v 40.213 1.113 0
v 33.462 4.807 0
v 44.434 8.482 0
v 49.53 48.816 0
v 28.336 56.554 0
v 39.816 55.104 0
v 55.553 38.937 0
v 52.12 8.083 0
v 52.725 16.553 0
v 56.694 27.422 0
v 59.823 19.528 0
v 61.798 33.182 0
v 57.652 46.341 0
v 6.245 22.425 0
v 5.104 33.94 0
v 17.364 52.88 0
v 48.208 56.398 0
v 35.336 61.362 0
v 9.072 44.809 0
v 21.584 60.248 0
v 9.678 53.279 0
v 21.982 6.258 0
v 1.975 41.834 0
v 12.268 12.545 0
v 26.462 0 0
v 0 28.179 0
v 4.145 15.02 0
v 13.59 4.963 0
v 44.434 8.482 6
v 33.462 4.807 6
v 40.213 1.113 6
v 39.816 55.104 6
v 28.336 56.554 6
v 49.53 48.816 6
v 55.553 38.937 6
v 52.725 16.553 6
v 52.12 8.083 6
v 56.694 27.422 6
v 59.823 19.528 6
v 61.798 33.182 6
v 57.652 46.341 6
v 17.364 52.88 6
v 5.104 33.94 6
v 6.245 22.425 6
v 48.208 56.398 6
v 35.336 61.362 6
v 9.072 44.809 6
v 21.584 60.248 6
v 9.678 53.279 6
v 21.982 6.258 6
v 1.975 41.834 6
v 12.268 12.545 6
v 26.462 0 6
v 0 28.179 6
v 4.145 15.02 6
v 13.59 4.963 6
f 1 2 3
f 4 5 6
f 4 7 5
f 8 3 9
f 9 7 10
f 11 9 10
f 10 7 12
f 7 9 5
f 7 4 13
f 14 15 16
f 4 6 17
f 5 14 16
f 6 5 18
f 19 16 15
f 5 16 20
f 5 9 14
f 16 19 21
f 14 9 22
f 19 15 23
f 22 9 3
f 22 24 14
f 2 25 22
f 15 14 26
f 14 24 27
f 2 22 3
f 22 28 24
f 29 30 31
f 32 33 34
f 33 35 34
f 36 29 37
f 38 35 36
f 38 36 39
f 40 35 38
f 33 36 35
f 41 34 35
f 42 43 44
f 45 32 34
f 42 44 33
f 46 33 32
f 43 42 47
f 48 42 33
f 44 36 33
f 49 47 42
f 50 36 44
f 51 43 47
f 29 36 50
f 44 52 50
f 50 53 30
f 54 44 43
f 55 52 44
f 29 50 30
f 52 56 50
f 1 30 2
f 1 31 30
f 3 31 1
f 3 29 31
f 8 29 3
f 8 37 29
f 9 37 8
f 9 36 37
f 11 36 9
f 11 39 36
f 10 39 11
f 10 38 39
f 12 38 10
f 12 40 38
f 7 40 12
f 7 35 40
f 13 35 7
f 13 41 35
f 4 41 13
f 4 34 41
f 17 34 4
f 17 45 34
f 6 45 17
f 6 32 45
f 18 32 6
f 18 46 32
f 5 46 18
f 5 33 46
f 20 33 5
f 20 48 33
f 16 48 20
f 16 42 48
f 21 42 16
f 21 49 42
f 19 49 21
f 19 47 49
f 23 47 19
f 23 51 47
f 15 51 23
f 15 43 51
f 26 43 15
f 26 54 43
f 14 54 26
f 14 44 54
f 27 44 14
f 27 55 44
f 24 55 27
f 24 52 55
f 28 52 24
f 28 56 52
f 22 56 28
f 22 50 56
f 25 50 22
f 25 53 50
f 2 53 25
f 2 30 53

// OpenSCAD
$fn = 32;

// ----------------------------------------------------------------------
// Chain sprocket: 14 teeth, 26 mm root radius
// ----------------------------------------------------------------------

// --- parameters (mm) ---
profile_height = 6;       // extrusion height
profile_points = 28;      // points of the closed outline

profile = [[56.694, 27.422], [61.798, 33.182], [55.553, 38.937], [57.652, 46.341], [49.53, 48.816], [48.208, 56.398], [39.816, 55.104], [35.336, 61.362], [28.336, 56.554], [21.584, 60.248], [17.364, 52.88], [9.678, 53.279], [9.072, 44.809], [1.975, 41.834], [5.104, 33.94], [0, 28.179], [6.245, 22.425], [4.145, 15.02], [12.268, 12.545], [13.59, 4.963], [21.982, 6.258], [26.462, 0], [33.462, 4.807], [40.213, 1.113], [44.434, 8.482], [52.12, 8.083], [52.725, 16.553], [59.823, 19.528]];  // single closed polygon, 28 points, counter clockwise

// --- the one profile operation ---
linear_extrude(height = profile_height) polygon(points = profile);
